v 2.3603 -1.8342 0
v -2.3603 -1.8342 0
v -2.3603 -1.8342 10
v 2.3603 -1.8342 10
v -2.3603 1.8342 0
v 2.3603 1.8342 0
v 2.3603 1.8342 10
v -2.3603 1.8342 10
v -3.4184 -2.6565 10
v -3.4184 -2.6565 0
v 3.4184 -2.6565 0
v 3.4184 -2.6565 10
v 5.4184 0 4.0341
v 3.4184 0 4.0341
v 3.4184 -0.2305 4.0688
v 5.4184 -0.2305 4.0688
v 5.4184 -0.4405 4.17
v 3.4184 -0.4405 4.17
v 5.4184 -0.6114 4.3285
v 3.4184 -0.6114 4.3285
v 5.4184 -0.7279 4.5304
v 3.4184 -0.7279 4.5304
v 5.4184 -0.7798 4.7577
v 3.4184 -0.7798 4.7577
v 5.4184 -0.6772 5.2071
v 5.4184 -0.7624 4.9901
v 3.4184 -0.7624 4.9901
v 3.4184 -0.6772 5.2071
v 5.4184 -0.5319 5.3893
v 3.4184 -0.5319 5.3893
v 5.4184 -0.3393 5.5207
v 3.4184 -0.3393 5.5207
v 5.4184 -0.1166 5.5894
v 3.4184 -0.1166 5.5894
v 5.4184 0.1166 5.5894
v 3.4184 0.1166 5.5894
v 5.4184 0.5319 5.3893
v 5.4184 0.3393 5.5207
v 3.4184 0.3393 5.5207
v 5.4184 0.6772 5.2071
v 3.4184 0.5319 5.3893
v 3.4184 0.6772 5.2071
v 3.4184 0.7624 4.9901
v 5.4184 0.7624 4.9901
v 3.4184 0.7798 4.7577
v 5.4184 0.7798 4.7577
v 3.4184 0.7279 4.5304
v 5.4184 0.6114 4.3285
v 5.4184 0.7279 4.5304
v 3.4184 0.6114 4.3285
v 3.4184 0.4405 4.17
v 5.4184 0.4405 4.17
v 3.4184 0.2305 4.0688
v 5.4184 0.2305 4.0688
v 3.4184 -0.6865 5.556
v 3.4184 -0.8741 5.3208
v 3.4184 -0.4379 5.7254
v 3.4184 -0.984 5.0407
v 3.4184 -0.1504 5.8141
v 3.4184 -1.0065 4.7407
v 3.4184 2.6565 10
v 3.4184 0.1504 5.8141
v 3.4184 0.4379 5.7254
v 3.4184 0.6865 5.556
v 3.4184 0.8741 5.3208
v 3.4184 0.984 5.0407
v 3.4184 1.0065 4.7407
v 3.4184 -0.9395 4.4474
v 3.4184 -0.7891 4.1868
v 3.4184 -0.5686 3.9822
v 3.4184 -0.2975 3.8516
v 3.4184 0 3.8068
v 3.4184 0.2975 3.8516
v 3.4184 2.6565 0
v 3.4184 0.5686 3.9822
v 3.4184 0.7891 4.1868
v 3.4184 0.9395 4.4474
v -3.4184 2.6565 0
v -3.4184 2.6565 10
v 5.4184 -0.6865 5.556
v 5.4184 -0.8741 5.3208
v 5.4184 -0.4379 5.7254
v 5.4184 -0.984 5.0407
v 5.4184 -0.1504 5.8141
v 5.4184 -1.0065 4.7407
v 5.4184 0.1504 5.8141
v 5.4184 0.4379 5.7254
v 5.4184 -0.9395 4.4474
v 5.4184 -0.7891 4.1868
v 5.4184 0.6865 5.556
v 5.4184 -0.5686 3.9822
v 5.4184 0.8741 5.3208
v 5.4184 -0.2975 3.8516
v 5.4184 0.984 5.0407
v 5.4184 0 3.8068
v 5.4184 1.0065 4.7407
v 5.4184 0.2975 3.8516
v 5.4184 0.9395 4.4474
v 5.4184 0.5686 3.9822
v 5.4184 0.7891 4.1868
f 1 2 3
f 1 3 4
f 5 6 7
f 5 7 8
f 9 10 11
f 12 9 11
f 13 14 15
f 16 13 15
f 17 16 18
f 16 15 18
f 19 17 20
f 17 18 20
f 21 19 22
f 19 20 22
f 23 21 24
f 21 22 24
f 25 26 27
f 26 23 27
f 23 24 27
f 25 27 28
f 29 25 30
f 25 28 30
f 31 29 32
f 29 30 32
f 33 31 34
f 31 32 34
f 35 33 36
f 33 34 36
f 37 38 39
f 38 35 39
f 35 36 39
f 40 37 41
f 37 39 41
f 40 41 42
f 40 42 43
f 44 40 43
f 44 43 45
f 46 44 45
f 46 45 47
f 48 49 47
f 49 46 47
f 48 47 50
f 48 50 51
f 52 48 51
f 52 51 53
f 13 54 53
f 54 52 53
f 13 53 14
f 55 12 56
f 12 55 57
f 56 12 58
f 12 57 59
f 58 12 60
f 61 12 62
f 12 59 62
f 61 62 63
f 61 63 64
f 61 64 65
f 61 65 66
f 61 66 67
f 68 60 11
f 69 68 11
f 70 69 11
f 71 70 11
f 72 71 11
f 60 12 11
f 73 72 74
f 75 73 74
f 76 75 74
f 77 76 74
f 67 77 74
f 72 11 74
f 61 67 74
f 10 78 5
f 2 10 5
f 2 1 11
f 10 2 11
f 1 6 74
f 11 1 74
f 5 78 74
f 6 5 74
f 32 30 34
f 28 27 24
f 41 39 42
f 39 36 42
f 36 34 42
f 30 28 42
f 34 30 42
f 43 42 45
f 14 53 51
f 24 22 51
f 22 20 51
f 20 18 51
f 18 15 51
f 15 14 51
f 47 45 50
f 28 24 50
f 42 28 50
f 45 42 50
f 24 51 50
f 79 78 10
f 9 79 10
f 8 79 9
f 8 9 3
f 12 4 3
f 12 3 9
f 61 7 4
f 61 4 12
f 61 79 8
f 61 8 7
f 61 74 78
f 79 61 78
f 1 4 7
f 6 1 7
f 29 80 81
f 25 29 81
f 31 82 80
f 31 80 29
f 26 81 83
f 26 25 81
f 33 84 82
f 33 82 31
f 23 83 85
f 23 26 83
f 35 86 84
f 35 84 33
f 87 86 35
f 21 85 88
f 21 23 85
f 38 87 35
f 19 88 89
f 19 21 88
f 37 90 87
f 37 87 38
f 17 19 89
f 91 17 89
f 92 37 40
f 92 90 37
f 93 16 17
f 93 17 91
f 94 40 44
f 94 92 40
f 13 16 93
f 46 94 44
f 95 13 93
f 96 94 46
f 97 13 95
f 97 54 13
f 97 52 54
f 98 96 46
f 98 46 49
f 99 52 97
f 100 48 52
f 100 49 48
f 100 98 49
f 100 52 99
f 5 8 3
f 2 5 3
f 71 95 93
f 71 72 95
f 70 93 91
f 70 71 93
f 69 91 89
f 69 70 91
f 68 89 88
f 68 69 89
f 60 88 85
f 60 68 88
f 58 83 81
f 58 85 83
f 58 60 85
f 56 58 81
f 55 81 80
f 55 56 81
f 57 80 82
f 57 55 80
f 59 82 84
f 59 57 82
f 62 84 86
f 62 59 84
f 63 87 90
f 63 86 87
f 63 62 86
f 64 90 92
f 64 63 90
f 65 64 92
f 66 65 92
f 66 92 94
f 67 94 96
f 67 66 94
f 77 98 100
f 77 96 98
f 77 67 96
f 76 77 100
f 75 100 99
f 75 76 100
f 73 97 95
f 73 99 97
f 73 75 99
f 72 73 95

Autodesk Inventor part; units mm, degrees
ref_plane "YZ Plane" through (0, 0, 0) normal (1, 0, 0) x (0, 1, 0)
ref_plane "XZ Plane" through (0, 0, 0) normal (0, 1, 0) x (-1, 0, 0)
ref_plane "XY Plane" through (0, 0, 0) normal (0, 0, 1) x (1, 0, 0)
sketch "Sketch1" plane through (0, 0, 0) normal (0, 0, 1) x (1, 0, 0)
  line L0 (-3.4184, -2.6565) -> (3.4184, -2.6565)
  line L1 (3.4184, -2.6565) -> (3.4184, 2.6565)
  line L2 (3.4184, 2.6565) -> (-3.4184, 2.6565)
  line L3 (-3.4184, 2.6565) -> (-3.4184, -2.6565)
  line L4 (-3.4184, -2.6565) -> (3.4184, 2.6565) construction
  line L5 (3.4184, -2.6565) -> (-3.4184, 2.6565) construction
  line L6 (-2.3603, -1.8342) -> (2.3603, -1.8342)
  line L7 (2.3603, -1.8342) -> (2.3603, 1.8342)
  line L8 (2.3603, 1.8342) -> (-2.3603, 1.8342)
  line L9 (-2.3603, 1.8342) -> (-2.3603, -1.8342)
  line L10 (-2.3603, -1.8342) -> (2.3603, 1.8342) construction
  line L11 (2.3603, -1.8342) -> (-2.3603, 1.8342) construction
  point P0 (0, 0)
extrude "Extrusion1" add sketch "Sketch1" along normal blind 10
sketch "Sketch2" plane through (3.4184, -2.6565, 0) normal (1, 0, 0) x (0, 0, -1)
  circle A0 centre (-4.8161, 2.6565) radius 1.0093
  circle A1 centre (-4.8161, 2.6565) radius 0.782
  point P0 (0, 2.6565)
extrude "Extrusion2" add sketch "Sketch2" along normal blind 2
